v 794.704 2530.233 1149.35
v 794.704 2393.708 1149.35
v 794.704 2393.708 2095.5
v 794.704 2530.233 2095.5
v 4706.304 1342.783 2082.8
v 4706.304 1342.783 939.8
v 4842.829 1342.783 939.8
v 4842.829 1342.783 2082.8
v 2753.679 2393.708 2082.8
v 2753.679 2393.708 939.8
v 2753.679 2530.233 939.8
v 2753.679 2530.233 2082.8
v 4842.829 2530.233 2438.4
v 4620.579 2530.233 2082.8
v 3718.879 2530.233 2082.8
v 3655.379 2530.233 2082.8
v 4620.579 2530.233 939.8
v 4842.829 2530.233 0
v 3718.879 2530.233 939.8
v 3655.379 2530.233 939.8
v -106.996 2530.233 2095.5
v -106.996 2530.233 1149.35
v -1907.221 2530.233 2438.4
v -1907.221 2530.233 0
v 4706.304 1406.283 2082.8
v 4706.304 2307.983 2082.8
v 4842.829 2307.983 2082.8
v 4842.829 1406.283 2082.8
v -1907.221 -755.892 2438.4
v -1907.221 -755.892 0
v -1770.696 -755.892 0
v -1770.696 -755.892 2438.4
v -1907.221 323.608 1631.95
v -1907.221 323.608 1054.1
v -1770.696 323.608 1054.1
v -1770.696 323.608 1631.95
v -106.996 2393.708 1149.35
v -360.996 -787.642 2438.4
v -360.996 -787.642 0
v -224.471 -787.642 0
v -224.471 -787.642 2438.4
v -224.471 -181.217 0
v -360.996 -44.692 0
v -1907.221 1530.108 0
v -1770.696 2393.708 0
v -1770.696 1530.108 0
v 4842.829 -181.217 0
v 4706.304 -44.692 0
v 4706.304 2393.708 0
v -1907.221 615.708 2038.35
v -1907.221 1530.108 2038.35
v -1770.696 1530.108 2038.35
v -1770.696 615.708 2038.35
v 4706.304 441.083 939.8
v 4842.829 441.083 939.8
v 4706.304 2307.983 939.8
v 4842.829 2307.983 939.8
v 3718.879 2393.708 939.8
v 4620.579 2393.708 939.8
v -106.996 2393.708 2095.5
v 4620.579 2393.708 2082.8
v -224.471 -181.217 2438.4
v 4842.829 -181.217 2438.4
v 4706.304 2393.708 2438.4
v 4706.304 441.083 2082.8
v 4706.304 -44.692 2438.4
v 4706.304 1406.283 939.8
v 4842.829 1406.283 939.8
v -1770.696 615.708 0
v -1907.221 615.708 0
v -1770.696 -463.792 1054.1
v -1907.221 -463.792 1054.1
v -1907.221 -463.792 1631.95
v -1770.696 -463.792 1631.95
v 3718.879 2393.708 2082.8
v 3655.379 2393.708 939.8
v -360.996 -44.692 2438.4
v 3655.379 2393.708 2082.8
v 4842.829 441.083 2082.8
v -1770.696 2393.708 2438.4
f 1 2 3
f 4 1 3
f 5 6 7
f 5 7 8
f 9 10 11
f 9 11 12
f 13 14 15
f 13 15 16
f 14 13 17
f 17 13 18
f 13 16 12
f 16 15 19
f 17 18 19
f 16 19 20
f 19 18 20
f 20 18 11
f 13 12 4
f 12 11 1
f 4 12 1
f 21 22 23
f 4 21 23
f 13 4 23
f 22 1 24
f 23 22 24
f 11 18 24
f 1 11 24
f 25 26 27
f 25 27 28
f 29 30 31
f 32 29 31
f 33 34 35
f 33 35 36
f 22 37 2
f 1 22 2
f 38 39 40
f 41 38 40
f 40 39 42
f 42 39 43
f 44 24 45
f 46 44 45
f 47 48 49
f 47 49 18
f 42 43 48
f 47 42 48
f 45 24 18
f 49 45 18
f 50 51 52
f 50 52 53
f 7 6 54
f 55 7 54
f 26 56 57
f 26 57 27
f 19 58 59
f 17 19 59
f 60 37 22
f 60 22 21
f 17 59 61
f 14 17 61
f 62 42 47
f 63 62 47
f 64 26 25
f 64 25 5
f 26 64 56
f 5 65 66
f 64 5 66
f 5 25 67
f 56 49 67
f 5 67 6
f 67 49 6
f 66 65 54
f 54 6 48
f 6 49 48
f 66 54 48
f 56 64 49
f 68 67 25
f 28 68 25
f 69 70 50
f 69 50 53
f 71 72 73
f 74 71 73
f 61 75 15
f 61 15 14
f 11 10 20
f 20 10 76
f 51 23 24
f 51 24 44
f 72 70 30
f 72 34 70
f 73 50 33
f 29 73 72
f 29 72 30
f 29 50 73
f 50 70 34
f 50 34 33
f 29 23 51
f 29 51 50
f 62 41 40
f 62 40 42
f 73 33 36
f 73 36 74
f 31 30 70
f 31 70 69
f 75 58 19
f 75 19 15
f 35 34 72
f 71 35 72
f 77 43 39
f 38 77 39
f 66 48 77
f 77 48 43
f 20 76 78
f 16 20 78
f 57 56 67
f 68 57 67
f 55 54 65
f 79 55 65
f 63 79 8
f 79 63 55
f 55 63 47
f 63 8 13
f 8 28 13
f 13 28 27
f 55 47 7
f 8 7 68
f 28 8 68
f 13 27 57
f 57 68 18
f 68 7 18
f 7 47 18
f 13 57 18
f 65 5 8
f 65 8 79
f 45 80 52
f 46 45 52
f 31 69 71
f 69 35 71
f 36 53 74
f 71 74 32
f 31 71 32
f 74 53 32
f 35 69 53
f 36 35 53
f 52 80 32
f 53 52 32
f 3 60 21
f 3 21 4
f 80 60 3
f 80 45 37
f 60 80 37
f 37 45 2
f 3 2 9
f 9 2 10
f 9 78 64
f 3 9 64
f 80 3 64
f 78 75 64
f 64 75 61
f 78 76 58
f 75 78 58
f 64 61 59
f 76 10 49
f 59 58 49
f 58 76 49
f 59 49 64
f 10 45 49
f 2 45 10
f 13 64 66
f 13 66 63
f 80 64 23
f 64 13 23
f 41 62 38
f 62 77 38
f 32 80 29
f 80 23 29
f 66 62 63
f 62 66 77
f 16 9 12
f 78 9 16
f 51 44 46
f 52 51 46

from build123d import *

# Parameters (mm, degrees)
F0_W     = 136.525
F0_H     = 1371.6
F1_DEPTH = 2438.4
F2_W     = 901.7
F2_H     = 946.15
F2_H_2   = 1143
F3_DEPTH = 136.525
F4_W     = 901.7
F4_H     = 1143
F5_DEPTH = 136.525
F6_W     = 914.4
F6_H     = 400.05
F7_DEPTH = 136.525
F8_W     = 787.4
F8_H     = 577.85
F9_DEPTH = 136.525


with BuildPart() as f1:
    # F0 (on Top) → F1 (new body)
    with BuildSketch(Plane.XY):
        Polygon((-1770.695876, 1530.107668), (-1770.695876, 2393.707668), (4706.304124, 2393.707668), (4706.304124, -44.692332), (-360.995876, -44.692332), (-360.995876, -787.642332), (-224.470876, -787.642332), (-224.470876, -181.217332), (4842.829124, -181.217332), (4842.829124, 2530.232668), (-1907.220876, 2530.232668), (-1907.220876, 1530.107668), align=None)
        with Locations((-1838.958376, -70.092332)):
            Rectangle(F0_W, F0_H)
    extrude(amount=F1_DEPTH)

    # F2 (on face) → F3 (cut, through all)
    with BuildSketch(Plane.XZ.offset(-2393.707668)):
        with Locations((343.854124, 1622.425)):
            Rectangle(F2_W, F2_H)
        with Locations((3204.529124, 1511.3)):
            Rectangle(F2_W, F2_H_2)
        with Locations((4169.729124, 1511.3)):
            Rectangle(F2_W, F2_H_2)
    extrude(amount=-F3_DEPTH, mode=Mode.SUBTRACT)

    # F4 (on face) → F5 (cut, through all)
    with BuildSketch(Plane(origin=(4706.304124, 0, 0), x_dir=(0, -1, 0), z_dir=(-1, 0, 0))):
        with Locations((-1857.132668, 1511.3)):
            Rectangle(F4_W, F4_H)
        with Locations((-891.932668, 1511.3)):
            Rectangle(F4_W, F4_H)
    extrude(amount=-F5_DEPTH, mode=Mode.SUBTRACT)

    # F6 (on face) → F7 (join)
    with BuildSketch(Plane(origin=(-1907.220876, 0, 0), x_dir=(0, -1, 0), z_dir=(-1, 0, 0))):
        with Locations((-1072.907668, 2238.375)):
            Rectangle(F6_W, F6_H)
    extrude(amount=-F7_DEPTH)

    # F8 (on face) → F9 (cut, through all)
    with BuildSketch(Plane(origin=(-1907.220876, 0, 0), x_dir=(0, -1, 0), z_dir=(-1, 0, 0))):
        with Locations((70.092332, 1343.025)):
            Rectangle(F8_W, F8_H)
    extrude(amount=-F9_DEPTH, mode=Mode.SUBTRACT)


solid = f1.part
